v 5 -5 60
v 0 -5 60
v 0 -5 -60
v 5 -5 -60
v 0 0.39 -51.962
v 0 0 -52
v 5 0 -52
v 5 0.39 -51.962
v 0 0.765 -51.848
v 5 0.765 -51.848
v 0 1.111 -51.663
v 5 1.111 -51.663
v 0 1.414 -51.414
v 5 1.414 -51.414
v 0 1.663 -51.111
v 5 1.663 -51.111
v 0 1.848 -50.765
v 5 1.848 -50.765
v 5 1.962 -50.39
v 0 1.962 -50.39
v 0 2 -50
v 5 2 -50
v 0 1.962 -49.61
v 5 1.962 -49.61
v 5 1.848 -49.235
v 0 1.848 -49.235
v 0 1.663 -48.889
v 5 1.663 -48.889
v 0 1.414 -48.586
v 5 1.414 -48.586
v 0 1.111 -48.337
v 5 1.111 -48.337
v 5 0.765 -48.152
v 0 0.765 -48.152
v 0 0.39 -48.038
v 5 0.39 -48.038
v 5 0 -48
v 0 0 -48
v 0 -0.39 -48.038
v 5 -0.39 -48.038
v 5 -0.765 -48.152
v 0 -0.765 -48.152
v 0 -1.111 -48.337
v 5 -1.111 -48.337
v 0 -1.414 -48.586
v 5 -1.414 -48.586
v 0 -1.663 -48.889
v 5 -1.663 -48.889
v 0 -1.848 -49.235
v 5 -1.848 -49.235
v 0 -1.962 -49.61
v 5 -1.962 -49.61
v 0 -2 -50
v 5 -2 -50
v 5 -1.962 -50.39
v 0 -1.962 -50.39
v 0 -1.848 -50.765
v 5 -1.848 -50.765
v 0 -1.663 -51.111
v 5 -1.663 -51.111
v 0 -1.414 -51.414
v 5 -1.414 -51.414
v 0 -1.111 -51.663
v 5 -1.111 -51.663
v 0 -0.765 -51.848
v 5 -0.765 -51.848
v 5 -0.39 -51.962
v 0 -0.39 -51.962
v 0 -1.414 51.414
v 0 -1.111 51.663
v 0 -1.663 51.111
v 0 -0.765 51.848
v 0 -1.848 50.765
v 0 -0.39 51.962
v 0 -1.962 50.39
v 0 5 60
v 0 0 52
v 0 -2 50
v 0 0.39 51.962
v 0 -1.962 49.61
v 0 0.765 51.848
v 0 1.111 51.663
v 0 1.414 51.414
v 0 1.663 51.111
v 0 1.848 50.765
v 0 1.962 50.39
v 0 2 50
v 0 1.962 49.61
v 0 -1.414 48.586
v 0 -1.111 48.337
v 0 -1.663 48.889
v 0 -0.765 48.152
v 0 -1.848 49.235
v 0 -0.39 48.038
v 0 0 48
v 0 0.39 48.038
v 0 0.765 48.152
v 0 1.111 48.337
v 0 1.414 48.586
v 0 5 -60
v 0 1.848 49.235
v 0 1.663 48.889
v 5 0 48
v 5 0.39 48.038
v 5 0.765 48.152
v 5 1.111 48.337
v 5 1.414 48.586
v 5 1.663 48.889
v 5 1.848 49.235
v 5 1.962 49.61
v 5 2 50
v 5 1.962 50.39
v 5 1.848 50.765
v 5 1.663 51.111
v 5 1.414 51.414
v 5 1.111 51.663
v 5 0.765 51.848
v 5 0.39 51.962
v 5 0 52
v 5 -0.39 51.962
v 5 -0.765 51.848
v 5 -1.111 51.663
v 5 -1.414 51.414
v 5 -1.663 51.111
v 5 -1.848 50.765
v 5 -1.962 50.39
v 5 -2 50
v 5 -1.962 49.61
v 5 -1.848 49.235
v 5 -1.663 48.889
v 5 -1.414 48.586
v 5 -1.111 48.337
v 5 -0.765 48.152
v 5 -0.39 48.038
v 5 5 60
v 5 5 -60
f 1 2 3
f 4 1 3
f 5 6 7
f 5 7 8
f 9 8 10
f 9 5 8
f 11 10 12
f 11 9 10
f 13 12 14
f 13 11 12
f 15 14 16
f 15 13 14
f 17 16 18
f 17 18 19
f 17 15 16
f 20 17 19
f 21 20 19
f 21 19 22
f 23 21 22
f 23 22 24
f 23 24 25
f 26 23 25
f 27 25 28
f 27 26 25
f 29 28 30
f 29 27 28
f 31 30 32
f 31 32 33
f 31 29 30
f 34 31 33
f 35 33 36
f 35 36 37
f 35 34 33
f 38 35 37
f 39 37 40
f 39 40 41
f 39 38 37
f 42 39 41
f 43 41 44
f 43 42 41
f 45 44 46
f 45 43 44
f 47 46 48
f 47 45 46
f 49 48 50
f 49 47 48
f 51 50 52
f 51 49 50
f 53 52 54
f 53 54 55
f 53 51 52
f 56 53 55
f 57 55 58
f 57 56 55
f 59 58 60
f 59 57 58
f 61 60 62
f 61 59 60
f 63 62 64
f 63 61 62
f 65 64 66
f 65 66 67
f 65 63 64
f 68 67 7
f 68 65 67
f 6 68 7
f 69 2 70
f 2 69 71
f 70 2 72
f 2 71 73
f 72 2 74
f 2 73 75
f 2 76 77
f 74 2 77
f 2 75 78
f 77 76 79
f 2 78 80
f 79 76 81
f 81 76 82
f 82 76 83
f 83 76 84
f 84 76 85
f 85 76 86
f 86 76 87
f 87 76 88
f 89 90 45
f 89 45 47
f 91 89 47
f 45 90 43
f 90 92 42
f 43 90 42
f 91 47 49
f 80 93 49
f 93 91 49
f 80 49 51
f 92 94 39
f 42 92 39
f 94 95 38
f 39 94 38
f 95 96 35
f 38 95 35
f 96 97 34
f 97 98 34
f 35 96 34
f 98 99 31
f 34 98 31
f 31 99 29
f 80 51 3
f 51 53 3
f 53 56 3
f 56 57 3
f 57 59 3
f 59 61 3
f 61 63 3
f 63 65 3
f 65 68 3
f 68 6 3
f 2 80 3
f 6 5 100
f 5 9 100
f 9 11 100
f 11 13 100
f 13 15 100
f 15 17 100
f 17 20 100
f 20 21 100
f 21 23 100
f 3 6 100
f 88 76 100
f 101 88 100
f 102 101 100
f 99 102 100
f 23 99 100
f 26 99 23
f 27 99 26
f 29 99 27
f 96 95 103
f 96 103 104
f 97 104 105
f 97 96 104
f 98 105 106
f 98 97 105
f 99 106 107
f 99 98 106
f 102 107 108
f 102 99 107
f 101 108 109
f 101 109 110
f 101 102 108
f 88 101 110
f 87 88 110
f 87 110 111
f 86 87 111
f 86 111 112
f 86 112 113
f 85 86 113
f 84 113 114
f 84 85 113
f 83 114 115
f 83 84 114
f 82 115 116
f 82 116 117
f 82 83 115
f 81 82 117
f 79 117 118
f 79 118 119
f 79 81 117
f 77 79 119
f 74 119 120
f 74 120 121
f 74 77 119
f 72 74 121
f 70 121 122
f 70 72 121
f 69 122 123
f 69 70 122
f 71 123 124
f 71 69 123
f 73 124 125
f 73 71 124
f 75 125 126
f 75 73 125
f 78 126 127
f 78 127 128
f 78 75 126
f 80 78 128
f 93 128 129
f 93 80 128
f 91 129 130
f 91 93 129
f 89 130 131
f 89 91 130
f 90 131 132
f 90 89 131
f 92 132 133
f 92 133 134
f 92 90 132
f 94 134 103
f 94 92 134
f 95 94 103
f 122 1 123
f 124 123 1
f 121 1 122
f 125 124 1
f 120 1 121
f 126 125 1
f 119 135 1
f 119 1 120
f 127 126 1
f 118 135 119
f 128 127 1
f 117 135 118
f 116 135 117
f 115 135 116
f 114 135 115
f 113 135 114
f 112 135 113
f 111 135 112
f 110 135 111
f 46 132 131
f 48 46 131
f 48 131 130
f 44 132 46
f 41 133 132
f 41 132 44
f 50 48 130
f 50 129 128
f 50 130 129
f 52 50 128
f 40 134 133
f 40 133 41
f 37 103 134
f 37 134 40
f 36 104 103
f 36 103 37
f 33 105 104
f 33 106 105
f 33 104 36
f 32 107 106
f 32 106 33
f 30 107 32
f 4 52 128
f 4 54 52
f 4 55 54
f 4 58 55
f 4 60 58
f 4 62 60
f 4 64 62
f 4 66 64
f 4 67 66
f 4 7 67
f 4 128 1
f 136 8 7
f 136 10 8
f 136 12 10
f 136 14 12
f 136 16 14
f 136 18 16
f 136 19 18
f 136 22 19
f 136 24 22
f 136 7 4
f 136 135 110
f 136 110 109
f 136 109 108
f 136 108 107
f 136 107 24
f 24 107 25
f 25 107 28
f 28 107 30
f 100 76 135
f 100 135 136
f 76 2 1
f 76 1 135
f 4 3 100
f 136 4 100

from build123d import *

# Parameters (mm, degrees)
SKETCH_2_W      = 120
SKETCH_2_H      = 10
SKETCH_2_R      = 2
EXTRUDE_1_DEPTH = 5


with BuildPart() as part:
    # 草图2 → 凸台-拉伸1 (new body)
    with BuildSketch(Plane(origin=(0, 0, 0), x_dir=(0, 0, -1), z_dir=(1, 0, 0))):
        Rectangle(SKETCH_2_W, SKETCH_2_H)
        with Locations((-50, 0)):
            Circle(SKETCH_2_R, mode=Mode.SUBTRACT)
        with Locations((50, 0)):
            Circle(SKETCH_2_R, mode=Mode.SUBTRACT)
    extrude(amount=EXTRUDE_1_DEPTH)


solid = part.part
